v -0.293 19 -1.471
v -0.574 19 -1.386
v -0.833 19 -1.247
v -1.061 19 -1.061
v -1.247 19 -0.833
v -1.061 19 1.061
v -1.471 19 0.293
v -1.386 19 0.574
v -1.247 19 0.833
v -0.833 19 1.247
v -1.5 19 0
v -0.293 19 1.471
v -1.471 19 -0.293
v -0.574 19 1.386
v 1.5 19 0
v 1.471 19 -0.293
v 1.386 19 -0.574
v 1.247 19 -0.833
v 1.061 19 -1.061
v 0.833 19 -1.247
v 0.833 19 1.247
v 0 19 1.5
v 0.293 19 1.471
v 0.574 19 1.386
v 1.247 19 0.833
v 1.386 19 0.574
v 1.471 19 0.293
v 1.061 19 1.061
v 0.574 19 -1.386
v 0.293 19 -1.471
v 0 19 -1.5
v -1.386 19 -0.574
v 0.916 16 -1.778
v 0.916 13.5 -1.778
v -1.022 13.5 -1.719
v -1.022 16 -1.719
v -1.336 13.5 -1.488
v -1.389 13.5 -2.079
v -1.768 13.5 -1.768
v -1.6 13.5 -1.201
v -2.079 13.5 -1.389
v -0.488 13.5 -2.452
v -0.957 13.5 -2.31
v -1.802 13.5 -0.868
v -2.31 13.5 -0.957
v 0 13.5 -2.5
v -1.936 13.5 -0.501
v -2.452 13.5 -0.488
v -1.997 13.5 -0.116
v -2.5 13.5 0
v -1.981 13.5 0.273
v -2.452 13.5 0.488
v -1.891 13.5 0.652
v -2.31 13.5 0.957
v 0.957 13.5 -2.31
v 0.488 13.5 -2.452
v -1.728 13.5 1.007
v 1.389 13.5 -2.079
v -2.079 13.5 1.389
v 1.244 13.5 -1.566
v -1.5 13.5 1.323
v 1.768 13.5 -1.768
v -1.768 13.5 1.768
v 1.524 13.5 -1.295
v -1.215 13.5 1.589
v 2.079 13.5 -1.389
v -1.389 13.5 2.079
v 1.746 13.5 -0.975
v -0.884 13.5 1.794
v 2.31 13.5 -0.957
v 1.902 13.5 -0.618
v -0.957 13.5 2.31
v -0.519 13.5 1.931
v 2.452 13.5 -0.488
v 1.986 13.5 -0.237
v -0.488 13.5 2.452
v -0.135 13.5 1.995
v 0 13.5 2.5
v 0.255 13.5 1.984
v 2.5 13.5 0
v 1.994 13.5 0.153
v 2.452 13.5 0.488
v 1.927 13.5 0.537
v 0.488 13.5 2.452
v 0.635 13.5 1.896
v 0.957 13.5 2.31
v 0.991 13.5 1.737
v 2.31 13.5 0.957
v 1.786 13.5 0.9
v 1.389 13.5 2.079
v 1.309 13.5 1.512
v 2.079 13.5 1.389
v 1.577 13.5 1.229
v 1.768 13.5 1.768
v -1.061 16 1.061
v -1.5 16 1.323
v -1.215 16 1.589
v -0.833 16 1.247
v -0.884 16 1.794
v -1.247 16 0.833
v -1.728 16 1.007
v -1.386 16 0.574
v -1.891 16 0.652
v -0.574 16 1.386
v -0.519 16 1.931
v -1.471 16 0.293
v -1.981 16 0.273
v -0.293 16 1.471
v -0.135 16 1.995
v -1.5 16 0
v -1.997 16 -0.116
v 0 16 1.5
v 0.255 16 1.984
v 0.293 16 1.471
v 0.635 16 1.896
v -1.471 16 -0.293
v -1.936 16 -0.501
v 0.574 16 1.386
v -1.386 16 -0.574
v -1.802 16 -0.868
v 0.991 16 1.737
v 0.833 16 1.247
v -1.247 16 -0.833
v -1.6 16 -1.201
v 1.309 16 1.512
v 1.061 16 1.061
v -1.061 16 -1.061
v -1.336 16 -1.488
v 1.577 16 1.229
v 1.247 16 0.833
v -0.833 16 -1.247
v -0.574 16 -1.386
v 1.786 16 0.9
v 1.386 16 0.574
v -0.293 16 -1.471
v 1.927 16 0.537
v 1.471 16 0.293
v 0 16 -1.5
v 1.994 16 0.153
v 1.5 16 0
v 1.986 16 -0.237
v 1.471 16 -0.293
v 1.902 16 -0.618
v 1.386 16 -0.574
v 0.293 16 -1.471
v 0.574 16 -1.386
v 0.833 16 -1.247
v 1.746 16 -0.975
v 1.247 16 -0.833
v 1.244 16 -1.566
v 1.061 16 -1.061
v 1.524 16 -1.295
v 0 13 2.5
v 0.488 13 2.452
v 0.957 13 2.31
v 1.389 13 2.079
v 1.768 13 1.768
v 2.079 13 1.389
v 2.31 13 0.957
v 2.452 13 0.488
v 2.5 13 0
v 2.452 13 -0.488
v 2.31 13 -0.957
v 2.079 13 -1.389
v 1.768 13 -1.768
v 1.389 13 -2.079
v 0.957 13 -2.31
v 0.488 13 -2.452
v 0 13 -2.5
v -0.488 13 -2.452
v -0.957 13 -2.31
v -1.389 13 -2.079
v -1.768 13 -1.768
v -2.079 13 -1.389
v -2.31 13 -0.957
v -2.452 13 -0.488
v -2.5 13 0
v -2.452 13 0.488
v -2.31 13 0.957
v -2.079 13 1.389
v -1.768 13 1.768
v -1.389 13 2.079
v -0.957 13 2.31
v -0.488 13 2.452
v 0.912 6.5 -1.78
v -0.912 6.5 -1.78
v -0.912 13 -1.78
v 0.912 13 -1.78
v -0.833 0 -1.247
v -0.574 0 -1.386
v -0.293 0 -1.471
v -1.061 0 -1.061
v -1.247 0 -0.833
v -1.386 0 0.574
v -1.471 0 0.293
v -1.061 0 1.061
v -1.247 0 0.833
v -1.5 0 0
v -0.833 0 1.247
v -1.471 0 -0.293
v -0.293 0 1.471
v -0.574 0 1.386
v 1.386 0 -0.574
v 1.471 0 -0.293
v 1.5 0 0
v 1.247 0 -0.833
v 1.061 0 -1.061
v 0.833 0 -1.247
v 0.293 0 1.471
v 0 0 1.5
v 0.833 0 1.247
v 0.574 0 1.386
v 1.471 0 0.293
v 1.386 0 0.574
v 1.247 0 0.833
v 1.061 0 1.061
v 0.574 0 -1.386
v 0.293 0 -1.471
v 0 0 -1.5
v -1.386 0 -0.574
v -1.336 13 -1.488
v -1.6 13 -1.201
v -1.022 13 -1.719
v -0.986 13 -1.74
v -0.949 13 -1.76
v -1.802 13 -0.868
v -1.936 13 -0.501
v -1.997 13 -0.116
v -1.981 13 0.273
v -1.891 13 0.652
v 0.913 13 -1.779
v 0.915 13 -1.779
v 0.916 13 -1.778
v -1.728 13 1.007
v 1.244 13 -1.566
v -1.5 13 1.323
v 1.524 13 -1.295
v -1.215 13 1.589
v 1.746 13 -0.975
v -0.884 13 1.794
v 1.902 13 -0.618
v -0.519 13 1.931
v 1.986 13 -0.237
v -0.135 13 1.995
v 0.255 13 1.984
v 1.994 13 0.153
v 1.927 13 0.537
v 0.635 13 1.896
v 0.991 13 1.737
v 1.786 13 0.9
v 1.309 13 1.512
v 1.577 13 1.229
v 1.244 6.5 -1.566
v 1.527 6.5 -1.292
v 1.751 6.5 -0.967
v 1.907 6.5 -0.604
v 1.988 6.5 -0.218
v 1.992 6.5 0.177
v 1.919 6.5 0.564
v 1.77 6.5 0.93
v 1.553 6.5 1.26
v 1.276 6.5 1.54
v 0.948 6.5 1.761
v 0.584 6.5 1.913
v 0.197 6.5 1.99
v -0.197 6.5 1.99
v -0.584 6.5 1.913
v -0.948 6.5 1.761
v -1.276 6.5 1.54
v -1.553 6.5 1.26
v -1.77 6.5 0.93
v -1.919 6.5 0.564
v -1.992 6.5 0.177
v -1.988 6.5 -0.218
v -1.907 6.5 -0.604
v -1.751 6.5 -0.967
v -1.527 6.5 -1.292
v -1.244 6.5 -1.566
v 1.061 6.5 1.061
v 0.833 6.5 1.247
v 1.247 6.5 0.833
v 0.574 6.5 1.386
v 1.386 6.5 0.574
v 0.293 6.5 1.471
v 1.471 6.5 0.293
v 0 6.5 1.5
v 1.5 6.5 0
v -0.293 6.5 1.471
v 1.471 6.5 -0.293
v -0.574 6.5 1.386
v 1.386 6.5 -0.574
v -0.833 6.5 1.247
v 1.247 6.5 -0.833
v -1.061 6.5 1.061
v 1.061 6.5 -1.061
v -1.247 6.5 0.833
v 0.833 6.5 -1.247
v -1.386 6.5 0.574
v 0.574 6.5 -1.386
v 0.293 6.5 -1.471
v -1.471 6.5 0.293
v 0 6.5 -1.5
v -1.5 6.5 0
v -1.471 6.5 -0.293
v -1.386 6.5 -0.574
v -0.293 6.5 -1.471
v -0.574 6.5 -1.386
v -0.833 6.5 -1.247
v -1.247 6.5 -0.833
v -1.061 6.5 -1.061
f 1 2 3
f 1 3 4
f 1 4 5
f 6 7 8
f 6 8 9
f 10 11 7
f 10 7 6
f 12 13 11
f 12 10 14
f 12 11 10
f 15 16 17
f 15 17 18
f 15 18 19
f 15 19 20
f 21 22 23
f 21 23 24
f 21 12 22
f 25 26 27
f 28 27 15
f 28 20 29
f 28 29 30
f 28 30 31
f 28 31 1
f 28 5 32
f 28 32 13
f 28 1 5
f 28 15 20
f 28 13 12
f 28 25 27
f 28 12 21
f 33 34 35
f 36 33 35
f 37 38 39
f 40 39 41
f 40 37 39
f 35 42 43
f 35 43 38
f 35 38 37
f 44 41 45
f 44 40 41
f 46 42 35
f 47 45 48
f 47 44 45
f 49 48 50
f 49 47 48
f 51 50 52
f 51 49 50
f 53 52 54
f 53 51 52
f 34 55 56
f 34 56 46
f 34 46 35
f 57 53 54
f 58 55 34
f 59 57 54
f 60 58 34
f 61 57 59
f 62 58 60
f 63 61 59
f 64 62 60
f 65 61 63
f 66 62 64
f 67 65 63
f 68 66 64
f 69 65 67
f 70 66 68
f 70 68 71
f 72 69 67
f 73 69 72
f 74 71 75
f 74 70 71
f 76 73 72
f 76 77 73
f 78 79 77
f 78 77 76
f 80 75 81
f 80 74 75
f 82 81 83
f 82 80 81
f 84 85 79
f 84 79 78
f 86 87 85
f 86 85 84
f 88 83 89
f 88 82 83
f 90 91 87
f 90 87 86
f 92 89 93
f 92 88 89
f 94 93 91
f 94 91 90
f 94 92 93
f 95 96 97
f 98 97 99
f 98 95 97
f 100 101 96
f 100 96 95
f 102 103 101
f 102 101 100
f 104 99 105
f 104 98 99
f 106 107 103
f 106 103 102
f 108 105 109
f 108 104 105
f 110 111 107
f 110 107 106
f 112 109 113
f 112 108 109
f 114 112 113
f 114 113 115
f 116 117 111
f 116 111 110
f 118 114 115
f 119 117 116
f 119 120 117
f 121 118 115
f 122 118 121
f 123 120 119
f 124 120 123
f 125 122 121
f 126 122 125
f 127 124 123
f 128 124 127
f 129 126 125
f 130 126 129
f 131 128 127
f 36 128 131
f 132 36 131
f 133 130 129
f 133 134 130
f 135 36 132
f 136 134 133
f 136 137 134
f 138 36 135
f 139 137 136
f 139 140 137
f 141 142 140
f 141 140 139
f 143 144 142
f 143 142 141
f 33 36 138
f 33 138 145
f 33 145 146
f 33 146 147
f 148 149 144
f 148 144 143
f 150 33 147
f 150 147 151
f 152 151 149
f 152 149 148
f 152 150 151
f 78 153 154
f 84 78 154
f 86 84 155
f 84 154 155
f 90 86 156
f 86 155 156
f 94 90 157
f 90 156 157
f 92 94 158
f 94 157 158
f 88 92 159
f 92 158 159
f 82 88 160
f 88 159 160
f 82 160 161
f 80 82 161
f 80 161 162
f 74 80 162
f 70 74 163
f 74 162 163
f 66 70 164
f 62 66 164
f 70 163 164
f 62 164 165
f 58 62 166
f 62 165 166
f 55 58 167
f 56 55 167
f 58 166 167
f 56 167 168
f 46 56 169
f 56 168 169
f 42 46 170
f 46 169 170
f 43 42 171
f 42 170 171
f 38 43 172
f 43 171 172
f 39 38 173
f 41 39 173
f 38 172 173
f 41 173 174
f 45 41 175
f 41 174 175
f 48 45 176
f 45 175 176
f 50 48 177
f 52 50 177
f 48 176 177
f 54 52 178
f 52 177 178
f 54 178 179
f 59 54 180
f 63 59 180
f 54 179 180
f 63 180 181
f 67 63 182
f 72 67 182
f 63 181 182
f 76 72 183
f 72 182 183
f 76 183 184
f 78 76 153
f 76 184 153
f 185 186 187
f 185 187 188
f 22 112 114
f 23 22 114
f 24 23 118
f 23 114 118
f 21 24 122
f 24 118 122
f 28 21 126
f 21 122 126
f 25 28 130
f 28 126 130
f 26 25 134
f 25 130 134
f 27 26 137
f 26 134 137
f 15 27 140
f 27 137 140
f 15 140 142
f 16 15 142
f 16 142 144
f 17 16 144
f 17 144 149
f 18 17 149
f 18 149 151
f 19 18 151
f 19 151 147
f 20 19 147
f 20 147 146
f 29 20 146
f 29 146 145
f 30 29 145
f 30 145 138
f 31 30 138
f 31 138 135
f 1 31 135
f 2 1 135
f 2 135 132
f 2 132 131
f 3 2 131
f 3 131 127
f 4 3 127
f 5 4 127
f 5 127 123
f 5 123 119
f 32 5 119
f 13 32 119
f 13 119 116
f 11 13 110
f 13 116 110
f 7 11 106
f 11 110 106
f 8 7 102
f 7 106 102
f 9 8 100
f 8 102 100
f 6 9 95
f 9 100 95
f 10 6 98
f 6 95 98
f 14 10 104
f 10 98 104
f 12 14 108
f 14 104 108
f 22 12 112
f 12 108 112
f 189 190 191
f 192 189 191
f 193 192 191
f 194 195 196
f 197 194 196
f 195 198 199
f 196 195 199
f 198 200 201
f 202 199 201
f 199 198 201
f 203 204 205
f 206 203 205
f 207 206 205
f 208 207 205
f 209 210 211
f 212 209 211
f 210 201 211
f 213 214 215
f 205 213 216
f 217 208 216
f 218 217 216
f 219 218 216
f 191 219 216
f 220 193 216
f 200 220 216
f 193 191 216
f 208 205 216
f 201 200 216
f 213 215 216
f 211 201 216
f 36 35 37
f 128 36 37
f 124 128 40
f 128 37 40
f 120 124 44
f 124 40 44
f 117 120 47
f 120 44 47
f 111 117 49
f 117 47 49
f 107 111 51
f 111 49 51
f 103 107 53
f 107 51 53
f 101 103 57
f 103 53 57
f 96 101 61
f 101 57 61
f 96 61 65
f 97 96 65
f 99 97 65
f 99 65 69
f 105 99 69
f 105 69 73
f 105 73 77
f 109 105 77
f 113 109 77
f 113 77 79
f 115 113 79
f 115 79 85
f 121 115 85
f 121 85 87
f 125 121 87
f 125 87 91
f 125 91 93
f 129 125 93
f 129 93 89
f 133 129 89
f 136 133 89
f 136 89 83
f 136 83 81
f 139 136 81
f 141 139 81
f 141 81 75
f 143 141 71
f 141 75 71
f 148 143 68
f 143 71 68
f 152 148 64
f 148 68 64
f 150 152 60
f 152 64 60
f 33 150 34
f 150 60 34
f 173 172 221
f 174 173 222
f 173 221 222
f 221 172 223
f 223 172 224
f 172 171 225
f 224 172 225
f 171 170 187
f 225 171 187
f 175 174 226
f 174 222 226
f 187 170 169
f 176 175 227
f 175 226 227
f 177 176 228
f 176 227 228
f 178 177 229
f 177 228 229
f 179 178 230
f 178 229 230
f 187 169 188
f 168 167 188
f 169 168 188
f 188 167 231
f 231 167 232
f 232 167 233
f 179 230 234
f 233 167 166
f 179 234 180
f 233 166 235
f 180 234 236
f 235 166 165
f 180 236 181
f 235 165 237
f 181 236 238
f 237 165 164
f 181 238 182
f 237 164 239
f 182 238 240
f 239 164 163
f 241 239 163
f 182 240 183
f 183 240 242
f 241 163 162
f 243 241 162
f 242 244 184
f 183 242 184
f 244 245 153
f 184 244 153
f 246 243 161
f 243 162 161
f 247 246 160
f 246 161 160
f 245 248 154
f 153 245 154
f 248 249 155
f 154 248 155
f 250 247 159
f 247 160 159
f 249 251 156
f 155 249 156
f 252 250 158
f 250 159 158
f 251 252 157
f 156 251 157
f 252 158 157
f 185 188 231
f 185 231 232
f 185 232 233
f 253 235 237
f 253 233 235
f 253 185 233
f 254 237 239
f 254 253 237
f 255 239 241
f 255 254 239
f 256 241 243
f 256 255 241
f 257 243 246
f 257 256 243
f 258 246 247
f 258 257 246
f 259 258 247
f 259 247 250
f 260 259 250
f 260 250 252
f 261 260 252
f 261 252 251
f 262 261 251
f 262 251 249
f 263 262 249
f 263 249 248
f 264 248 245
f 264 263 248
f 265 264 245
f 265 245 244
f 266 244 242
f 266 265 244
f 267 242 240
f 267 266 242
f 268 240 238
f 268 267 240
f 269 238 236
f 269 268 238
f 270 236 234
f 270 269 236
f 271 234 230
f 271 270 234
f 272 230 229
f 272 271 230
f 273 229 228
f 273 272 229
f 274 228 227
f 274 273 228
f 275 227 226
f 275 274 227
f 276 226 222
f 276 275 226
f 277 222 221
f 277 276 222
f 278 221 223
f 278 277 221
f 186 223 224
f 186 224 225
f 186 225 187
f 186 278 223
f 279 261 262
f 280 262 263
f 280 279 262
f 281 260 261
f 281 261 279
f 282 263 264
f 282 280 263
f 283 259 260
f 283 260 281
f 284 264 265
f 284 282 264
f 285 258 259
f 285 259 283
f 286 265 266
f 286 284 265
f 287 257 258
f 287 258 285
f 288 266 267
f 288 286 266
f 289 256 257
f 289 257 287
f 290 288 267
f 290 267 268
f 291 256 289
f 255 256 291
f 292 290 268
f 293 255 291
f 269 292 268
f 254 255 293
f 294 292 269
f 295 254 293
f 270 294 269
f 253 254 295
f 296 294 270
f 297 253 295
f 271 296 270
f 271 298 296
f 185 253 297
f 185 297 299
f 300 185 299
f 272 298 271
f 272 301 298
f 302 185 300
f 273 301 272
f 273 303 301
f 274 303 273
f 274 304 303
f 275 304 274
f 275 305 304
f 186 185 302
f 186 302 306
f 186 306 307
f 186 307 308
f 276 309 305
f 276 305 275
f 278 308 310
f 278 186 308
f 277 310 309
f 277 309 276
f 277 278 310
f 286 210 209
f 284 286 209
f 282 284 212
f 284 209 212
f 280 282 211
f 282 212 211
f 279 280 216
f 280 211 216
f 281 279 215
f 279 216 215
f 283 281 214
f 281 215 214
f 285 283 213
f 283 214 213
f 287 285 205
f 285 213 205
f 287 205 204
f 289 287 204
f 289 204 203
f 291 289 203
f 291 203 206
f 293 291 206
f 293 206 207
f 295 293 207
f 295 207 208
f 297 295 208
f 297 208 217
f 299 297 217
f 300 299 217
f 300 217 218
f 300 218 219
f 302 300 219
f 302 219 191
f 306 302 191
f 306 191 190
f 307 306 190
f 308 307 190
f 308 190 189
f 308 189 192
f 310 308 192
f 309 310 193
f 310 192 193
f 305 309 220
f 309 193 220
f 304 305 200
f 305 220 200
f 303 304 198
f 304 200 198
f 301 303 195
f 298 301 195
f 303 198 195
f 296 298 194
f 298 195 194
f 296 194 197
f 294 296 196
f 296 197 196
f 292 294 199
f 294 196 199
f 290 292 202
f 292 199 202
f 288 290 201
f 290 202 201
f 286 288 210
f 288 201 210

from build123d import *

# Parameters (mm, degrees)
SKETCH_1_R      = 1.5
EXTRUDE_1_DEPTH = 19
EXTRUDE_START   = 6.5
SKETCH_2_R      = 1.5
EXTRUDE_2_DEPTH = 6.5
SKETCH_3_R      = 1.5
EXTRUDE_3_DEPTH = 3
SKETCH_4_R      = 2.5
SKETCH_4_R_2    = 1.5
EXTRUDE_4_DEPTH = 0.5


with BuildPart() as part:
    # 草图1 → 凸台-拉伸1 (new body)
    with BuildSketch(Plane(origin=(0, 0, 0), x_dir=(1, 0, 0), z_dir=(0, 1, 0))):
        with Locations(Location((0, 0, 0), (0, 0, 270))):
            Circle(SKETCH_1_R)
    extrude(amount=EXTRUDE_1_DEPTH)

    # 草图2 → 凸台-拉伸2 (add)
    with BuildSketch(Plane(origin=(0, 13, 0), x_dir=(-1, 0, 0), z_dir=(0, -1, 0)).offset(EXTRUDE_START)):
        with BuildLine():
            Line((0.911921049, 1.78), (-0.911921049, 1.78))
            ThreePointArc((-0.911921049, 1.78), (0, -2), (0.911921049, 1.78))
        make_face()
        with Locations(Location((0, 0, 0), (0, 0, 90))):
            Circle(SKETCH_2_R, mode=Mode.SUBTRACT)
    extrude(amount=-EXTRUDE_2_DEPTH)

    # 草图3 → 凸台-拉伸3 (add)
    with BuildSketch(Plane(origin=(0, 13, 0), x_dir=(1, 0, 0), z_dir=(0, 1, 0))):
        with BuildLine():
            Line((0.91625301, 1.777774007), (-1.022249701, 1.719012958))
            ThreePointArc((-1.022249701, 1.719012958), (0.060597358, -1.999081779), (0.91625301, 1.777774007))
        make_face()
        with Locations(Location((0, 0, 0), (0, 0, 90))):
            Circle(SKETCH_3_R, mode=Mode.SUBTRACT)
    extrude(amount=EXTRUDE_3_DEPTH)

    # 草图4 → 凸台-拉伸4 (add)
    with BuildSketch(Plane(origin=(0, 13, 0), x_dir=(1, 0, 0), z_dir=(0, 1, 0))):
        with Locations(Location((0, 0, 0), (0, 0, 270))):
            Circle(SKETCH_4_R)
        with Locations(Location((0, 0, 0), (0, 0, 90))):
            Circle(SKETCH_4_R_2, mode=Mode.SUBTRACT)
    extrude(amount=EXTRUDE_4_DEPTH)


solid = part.part
